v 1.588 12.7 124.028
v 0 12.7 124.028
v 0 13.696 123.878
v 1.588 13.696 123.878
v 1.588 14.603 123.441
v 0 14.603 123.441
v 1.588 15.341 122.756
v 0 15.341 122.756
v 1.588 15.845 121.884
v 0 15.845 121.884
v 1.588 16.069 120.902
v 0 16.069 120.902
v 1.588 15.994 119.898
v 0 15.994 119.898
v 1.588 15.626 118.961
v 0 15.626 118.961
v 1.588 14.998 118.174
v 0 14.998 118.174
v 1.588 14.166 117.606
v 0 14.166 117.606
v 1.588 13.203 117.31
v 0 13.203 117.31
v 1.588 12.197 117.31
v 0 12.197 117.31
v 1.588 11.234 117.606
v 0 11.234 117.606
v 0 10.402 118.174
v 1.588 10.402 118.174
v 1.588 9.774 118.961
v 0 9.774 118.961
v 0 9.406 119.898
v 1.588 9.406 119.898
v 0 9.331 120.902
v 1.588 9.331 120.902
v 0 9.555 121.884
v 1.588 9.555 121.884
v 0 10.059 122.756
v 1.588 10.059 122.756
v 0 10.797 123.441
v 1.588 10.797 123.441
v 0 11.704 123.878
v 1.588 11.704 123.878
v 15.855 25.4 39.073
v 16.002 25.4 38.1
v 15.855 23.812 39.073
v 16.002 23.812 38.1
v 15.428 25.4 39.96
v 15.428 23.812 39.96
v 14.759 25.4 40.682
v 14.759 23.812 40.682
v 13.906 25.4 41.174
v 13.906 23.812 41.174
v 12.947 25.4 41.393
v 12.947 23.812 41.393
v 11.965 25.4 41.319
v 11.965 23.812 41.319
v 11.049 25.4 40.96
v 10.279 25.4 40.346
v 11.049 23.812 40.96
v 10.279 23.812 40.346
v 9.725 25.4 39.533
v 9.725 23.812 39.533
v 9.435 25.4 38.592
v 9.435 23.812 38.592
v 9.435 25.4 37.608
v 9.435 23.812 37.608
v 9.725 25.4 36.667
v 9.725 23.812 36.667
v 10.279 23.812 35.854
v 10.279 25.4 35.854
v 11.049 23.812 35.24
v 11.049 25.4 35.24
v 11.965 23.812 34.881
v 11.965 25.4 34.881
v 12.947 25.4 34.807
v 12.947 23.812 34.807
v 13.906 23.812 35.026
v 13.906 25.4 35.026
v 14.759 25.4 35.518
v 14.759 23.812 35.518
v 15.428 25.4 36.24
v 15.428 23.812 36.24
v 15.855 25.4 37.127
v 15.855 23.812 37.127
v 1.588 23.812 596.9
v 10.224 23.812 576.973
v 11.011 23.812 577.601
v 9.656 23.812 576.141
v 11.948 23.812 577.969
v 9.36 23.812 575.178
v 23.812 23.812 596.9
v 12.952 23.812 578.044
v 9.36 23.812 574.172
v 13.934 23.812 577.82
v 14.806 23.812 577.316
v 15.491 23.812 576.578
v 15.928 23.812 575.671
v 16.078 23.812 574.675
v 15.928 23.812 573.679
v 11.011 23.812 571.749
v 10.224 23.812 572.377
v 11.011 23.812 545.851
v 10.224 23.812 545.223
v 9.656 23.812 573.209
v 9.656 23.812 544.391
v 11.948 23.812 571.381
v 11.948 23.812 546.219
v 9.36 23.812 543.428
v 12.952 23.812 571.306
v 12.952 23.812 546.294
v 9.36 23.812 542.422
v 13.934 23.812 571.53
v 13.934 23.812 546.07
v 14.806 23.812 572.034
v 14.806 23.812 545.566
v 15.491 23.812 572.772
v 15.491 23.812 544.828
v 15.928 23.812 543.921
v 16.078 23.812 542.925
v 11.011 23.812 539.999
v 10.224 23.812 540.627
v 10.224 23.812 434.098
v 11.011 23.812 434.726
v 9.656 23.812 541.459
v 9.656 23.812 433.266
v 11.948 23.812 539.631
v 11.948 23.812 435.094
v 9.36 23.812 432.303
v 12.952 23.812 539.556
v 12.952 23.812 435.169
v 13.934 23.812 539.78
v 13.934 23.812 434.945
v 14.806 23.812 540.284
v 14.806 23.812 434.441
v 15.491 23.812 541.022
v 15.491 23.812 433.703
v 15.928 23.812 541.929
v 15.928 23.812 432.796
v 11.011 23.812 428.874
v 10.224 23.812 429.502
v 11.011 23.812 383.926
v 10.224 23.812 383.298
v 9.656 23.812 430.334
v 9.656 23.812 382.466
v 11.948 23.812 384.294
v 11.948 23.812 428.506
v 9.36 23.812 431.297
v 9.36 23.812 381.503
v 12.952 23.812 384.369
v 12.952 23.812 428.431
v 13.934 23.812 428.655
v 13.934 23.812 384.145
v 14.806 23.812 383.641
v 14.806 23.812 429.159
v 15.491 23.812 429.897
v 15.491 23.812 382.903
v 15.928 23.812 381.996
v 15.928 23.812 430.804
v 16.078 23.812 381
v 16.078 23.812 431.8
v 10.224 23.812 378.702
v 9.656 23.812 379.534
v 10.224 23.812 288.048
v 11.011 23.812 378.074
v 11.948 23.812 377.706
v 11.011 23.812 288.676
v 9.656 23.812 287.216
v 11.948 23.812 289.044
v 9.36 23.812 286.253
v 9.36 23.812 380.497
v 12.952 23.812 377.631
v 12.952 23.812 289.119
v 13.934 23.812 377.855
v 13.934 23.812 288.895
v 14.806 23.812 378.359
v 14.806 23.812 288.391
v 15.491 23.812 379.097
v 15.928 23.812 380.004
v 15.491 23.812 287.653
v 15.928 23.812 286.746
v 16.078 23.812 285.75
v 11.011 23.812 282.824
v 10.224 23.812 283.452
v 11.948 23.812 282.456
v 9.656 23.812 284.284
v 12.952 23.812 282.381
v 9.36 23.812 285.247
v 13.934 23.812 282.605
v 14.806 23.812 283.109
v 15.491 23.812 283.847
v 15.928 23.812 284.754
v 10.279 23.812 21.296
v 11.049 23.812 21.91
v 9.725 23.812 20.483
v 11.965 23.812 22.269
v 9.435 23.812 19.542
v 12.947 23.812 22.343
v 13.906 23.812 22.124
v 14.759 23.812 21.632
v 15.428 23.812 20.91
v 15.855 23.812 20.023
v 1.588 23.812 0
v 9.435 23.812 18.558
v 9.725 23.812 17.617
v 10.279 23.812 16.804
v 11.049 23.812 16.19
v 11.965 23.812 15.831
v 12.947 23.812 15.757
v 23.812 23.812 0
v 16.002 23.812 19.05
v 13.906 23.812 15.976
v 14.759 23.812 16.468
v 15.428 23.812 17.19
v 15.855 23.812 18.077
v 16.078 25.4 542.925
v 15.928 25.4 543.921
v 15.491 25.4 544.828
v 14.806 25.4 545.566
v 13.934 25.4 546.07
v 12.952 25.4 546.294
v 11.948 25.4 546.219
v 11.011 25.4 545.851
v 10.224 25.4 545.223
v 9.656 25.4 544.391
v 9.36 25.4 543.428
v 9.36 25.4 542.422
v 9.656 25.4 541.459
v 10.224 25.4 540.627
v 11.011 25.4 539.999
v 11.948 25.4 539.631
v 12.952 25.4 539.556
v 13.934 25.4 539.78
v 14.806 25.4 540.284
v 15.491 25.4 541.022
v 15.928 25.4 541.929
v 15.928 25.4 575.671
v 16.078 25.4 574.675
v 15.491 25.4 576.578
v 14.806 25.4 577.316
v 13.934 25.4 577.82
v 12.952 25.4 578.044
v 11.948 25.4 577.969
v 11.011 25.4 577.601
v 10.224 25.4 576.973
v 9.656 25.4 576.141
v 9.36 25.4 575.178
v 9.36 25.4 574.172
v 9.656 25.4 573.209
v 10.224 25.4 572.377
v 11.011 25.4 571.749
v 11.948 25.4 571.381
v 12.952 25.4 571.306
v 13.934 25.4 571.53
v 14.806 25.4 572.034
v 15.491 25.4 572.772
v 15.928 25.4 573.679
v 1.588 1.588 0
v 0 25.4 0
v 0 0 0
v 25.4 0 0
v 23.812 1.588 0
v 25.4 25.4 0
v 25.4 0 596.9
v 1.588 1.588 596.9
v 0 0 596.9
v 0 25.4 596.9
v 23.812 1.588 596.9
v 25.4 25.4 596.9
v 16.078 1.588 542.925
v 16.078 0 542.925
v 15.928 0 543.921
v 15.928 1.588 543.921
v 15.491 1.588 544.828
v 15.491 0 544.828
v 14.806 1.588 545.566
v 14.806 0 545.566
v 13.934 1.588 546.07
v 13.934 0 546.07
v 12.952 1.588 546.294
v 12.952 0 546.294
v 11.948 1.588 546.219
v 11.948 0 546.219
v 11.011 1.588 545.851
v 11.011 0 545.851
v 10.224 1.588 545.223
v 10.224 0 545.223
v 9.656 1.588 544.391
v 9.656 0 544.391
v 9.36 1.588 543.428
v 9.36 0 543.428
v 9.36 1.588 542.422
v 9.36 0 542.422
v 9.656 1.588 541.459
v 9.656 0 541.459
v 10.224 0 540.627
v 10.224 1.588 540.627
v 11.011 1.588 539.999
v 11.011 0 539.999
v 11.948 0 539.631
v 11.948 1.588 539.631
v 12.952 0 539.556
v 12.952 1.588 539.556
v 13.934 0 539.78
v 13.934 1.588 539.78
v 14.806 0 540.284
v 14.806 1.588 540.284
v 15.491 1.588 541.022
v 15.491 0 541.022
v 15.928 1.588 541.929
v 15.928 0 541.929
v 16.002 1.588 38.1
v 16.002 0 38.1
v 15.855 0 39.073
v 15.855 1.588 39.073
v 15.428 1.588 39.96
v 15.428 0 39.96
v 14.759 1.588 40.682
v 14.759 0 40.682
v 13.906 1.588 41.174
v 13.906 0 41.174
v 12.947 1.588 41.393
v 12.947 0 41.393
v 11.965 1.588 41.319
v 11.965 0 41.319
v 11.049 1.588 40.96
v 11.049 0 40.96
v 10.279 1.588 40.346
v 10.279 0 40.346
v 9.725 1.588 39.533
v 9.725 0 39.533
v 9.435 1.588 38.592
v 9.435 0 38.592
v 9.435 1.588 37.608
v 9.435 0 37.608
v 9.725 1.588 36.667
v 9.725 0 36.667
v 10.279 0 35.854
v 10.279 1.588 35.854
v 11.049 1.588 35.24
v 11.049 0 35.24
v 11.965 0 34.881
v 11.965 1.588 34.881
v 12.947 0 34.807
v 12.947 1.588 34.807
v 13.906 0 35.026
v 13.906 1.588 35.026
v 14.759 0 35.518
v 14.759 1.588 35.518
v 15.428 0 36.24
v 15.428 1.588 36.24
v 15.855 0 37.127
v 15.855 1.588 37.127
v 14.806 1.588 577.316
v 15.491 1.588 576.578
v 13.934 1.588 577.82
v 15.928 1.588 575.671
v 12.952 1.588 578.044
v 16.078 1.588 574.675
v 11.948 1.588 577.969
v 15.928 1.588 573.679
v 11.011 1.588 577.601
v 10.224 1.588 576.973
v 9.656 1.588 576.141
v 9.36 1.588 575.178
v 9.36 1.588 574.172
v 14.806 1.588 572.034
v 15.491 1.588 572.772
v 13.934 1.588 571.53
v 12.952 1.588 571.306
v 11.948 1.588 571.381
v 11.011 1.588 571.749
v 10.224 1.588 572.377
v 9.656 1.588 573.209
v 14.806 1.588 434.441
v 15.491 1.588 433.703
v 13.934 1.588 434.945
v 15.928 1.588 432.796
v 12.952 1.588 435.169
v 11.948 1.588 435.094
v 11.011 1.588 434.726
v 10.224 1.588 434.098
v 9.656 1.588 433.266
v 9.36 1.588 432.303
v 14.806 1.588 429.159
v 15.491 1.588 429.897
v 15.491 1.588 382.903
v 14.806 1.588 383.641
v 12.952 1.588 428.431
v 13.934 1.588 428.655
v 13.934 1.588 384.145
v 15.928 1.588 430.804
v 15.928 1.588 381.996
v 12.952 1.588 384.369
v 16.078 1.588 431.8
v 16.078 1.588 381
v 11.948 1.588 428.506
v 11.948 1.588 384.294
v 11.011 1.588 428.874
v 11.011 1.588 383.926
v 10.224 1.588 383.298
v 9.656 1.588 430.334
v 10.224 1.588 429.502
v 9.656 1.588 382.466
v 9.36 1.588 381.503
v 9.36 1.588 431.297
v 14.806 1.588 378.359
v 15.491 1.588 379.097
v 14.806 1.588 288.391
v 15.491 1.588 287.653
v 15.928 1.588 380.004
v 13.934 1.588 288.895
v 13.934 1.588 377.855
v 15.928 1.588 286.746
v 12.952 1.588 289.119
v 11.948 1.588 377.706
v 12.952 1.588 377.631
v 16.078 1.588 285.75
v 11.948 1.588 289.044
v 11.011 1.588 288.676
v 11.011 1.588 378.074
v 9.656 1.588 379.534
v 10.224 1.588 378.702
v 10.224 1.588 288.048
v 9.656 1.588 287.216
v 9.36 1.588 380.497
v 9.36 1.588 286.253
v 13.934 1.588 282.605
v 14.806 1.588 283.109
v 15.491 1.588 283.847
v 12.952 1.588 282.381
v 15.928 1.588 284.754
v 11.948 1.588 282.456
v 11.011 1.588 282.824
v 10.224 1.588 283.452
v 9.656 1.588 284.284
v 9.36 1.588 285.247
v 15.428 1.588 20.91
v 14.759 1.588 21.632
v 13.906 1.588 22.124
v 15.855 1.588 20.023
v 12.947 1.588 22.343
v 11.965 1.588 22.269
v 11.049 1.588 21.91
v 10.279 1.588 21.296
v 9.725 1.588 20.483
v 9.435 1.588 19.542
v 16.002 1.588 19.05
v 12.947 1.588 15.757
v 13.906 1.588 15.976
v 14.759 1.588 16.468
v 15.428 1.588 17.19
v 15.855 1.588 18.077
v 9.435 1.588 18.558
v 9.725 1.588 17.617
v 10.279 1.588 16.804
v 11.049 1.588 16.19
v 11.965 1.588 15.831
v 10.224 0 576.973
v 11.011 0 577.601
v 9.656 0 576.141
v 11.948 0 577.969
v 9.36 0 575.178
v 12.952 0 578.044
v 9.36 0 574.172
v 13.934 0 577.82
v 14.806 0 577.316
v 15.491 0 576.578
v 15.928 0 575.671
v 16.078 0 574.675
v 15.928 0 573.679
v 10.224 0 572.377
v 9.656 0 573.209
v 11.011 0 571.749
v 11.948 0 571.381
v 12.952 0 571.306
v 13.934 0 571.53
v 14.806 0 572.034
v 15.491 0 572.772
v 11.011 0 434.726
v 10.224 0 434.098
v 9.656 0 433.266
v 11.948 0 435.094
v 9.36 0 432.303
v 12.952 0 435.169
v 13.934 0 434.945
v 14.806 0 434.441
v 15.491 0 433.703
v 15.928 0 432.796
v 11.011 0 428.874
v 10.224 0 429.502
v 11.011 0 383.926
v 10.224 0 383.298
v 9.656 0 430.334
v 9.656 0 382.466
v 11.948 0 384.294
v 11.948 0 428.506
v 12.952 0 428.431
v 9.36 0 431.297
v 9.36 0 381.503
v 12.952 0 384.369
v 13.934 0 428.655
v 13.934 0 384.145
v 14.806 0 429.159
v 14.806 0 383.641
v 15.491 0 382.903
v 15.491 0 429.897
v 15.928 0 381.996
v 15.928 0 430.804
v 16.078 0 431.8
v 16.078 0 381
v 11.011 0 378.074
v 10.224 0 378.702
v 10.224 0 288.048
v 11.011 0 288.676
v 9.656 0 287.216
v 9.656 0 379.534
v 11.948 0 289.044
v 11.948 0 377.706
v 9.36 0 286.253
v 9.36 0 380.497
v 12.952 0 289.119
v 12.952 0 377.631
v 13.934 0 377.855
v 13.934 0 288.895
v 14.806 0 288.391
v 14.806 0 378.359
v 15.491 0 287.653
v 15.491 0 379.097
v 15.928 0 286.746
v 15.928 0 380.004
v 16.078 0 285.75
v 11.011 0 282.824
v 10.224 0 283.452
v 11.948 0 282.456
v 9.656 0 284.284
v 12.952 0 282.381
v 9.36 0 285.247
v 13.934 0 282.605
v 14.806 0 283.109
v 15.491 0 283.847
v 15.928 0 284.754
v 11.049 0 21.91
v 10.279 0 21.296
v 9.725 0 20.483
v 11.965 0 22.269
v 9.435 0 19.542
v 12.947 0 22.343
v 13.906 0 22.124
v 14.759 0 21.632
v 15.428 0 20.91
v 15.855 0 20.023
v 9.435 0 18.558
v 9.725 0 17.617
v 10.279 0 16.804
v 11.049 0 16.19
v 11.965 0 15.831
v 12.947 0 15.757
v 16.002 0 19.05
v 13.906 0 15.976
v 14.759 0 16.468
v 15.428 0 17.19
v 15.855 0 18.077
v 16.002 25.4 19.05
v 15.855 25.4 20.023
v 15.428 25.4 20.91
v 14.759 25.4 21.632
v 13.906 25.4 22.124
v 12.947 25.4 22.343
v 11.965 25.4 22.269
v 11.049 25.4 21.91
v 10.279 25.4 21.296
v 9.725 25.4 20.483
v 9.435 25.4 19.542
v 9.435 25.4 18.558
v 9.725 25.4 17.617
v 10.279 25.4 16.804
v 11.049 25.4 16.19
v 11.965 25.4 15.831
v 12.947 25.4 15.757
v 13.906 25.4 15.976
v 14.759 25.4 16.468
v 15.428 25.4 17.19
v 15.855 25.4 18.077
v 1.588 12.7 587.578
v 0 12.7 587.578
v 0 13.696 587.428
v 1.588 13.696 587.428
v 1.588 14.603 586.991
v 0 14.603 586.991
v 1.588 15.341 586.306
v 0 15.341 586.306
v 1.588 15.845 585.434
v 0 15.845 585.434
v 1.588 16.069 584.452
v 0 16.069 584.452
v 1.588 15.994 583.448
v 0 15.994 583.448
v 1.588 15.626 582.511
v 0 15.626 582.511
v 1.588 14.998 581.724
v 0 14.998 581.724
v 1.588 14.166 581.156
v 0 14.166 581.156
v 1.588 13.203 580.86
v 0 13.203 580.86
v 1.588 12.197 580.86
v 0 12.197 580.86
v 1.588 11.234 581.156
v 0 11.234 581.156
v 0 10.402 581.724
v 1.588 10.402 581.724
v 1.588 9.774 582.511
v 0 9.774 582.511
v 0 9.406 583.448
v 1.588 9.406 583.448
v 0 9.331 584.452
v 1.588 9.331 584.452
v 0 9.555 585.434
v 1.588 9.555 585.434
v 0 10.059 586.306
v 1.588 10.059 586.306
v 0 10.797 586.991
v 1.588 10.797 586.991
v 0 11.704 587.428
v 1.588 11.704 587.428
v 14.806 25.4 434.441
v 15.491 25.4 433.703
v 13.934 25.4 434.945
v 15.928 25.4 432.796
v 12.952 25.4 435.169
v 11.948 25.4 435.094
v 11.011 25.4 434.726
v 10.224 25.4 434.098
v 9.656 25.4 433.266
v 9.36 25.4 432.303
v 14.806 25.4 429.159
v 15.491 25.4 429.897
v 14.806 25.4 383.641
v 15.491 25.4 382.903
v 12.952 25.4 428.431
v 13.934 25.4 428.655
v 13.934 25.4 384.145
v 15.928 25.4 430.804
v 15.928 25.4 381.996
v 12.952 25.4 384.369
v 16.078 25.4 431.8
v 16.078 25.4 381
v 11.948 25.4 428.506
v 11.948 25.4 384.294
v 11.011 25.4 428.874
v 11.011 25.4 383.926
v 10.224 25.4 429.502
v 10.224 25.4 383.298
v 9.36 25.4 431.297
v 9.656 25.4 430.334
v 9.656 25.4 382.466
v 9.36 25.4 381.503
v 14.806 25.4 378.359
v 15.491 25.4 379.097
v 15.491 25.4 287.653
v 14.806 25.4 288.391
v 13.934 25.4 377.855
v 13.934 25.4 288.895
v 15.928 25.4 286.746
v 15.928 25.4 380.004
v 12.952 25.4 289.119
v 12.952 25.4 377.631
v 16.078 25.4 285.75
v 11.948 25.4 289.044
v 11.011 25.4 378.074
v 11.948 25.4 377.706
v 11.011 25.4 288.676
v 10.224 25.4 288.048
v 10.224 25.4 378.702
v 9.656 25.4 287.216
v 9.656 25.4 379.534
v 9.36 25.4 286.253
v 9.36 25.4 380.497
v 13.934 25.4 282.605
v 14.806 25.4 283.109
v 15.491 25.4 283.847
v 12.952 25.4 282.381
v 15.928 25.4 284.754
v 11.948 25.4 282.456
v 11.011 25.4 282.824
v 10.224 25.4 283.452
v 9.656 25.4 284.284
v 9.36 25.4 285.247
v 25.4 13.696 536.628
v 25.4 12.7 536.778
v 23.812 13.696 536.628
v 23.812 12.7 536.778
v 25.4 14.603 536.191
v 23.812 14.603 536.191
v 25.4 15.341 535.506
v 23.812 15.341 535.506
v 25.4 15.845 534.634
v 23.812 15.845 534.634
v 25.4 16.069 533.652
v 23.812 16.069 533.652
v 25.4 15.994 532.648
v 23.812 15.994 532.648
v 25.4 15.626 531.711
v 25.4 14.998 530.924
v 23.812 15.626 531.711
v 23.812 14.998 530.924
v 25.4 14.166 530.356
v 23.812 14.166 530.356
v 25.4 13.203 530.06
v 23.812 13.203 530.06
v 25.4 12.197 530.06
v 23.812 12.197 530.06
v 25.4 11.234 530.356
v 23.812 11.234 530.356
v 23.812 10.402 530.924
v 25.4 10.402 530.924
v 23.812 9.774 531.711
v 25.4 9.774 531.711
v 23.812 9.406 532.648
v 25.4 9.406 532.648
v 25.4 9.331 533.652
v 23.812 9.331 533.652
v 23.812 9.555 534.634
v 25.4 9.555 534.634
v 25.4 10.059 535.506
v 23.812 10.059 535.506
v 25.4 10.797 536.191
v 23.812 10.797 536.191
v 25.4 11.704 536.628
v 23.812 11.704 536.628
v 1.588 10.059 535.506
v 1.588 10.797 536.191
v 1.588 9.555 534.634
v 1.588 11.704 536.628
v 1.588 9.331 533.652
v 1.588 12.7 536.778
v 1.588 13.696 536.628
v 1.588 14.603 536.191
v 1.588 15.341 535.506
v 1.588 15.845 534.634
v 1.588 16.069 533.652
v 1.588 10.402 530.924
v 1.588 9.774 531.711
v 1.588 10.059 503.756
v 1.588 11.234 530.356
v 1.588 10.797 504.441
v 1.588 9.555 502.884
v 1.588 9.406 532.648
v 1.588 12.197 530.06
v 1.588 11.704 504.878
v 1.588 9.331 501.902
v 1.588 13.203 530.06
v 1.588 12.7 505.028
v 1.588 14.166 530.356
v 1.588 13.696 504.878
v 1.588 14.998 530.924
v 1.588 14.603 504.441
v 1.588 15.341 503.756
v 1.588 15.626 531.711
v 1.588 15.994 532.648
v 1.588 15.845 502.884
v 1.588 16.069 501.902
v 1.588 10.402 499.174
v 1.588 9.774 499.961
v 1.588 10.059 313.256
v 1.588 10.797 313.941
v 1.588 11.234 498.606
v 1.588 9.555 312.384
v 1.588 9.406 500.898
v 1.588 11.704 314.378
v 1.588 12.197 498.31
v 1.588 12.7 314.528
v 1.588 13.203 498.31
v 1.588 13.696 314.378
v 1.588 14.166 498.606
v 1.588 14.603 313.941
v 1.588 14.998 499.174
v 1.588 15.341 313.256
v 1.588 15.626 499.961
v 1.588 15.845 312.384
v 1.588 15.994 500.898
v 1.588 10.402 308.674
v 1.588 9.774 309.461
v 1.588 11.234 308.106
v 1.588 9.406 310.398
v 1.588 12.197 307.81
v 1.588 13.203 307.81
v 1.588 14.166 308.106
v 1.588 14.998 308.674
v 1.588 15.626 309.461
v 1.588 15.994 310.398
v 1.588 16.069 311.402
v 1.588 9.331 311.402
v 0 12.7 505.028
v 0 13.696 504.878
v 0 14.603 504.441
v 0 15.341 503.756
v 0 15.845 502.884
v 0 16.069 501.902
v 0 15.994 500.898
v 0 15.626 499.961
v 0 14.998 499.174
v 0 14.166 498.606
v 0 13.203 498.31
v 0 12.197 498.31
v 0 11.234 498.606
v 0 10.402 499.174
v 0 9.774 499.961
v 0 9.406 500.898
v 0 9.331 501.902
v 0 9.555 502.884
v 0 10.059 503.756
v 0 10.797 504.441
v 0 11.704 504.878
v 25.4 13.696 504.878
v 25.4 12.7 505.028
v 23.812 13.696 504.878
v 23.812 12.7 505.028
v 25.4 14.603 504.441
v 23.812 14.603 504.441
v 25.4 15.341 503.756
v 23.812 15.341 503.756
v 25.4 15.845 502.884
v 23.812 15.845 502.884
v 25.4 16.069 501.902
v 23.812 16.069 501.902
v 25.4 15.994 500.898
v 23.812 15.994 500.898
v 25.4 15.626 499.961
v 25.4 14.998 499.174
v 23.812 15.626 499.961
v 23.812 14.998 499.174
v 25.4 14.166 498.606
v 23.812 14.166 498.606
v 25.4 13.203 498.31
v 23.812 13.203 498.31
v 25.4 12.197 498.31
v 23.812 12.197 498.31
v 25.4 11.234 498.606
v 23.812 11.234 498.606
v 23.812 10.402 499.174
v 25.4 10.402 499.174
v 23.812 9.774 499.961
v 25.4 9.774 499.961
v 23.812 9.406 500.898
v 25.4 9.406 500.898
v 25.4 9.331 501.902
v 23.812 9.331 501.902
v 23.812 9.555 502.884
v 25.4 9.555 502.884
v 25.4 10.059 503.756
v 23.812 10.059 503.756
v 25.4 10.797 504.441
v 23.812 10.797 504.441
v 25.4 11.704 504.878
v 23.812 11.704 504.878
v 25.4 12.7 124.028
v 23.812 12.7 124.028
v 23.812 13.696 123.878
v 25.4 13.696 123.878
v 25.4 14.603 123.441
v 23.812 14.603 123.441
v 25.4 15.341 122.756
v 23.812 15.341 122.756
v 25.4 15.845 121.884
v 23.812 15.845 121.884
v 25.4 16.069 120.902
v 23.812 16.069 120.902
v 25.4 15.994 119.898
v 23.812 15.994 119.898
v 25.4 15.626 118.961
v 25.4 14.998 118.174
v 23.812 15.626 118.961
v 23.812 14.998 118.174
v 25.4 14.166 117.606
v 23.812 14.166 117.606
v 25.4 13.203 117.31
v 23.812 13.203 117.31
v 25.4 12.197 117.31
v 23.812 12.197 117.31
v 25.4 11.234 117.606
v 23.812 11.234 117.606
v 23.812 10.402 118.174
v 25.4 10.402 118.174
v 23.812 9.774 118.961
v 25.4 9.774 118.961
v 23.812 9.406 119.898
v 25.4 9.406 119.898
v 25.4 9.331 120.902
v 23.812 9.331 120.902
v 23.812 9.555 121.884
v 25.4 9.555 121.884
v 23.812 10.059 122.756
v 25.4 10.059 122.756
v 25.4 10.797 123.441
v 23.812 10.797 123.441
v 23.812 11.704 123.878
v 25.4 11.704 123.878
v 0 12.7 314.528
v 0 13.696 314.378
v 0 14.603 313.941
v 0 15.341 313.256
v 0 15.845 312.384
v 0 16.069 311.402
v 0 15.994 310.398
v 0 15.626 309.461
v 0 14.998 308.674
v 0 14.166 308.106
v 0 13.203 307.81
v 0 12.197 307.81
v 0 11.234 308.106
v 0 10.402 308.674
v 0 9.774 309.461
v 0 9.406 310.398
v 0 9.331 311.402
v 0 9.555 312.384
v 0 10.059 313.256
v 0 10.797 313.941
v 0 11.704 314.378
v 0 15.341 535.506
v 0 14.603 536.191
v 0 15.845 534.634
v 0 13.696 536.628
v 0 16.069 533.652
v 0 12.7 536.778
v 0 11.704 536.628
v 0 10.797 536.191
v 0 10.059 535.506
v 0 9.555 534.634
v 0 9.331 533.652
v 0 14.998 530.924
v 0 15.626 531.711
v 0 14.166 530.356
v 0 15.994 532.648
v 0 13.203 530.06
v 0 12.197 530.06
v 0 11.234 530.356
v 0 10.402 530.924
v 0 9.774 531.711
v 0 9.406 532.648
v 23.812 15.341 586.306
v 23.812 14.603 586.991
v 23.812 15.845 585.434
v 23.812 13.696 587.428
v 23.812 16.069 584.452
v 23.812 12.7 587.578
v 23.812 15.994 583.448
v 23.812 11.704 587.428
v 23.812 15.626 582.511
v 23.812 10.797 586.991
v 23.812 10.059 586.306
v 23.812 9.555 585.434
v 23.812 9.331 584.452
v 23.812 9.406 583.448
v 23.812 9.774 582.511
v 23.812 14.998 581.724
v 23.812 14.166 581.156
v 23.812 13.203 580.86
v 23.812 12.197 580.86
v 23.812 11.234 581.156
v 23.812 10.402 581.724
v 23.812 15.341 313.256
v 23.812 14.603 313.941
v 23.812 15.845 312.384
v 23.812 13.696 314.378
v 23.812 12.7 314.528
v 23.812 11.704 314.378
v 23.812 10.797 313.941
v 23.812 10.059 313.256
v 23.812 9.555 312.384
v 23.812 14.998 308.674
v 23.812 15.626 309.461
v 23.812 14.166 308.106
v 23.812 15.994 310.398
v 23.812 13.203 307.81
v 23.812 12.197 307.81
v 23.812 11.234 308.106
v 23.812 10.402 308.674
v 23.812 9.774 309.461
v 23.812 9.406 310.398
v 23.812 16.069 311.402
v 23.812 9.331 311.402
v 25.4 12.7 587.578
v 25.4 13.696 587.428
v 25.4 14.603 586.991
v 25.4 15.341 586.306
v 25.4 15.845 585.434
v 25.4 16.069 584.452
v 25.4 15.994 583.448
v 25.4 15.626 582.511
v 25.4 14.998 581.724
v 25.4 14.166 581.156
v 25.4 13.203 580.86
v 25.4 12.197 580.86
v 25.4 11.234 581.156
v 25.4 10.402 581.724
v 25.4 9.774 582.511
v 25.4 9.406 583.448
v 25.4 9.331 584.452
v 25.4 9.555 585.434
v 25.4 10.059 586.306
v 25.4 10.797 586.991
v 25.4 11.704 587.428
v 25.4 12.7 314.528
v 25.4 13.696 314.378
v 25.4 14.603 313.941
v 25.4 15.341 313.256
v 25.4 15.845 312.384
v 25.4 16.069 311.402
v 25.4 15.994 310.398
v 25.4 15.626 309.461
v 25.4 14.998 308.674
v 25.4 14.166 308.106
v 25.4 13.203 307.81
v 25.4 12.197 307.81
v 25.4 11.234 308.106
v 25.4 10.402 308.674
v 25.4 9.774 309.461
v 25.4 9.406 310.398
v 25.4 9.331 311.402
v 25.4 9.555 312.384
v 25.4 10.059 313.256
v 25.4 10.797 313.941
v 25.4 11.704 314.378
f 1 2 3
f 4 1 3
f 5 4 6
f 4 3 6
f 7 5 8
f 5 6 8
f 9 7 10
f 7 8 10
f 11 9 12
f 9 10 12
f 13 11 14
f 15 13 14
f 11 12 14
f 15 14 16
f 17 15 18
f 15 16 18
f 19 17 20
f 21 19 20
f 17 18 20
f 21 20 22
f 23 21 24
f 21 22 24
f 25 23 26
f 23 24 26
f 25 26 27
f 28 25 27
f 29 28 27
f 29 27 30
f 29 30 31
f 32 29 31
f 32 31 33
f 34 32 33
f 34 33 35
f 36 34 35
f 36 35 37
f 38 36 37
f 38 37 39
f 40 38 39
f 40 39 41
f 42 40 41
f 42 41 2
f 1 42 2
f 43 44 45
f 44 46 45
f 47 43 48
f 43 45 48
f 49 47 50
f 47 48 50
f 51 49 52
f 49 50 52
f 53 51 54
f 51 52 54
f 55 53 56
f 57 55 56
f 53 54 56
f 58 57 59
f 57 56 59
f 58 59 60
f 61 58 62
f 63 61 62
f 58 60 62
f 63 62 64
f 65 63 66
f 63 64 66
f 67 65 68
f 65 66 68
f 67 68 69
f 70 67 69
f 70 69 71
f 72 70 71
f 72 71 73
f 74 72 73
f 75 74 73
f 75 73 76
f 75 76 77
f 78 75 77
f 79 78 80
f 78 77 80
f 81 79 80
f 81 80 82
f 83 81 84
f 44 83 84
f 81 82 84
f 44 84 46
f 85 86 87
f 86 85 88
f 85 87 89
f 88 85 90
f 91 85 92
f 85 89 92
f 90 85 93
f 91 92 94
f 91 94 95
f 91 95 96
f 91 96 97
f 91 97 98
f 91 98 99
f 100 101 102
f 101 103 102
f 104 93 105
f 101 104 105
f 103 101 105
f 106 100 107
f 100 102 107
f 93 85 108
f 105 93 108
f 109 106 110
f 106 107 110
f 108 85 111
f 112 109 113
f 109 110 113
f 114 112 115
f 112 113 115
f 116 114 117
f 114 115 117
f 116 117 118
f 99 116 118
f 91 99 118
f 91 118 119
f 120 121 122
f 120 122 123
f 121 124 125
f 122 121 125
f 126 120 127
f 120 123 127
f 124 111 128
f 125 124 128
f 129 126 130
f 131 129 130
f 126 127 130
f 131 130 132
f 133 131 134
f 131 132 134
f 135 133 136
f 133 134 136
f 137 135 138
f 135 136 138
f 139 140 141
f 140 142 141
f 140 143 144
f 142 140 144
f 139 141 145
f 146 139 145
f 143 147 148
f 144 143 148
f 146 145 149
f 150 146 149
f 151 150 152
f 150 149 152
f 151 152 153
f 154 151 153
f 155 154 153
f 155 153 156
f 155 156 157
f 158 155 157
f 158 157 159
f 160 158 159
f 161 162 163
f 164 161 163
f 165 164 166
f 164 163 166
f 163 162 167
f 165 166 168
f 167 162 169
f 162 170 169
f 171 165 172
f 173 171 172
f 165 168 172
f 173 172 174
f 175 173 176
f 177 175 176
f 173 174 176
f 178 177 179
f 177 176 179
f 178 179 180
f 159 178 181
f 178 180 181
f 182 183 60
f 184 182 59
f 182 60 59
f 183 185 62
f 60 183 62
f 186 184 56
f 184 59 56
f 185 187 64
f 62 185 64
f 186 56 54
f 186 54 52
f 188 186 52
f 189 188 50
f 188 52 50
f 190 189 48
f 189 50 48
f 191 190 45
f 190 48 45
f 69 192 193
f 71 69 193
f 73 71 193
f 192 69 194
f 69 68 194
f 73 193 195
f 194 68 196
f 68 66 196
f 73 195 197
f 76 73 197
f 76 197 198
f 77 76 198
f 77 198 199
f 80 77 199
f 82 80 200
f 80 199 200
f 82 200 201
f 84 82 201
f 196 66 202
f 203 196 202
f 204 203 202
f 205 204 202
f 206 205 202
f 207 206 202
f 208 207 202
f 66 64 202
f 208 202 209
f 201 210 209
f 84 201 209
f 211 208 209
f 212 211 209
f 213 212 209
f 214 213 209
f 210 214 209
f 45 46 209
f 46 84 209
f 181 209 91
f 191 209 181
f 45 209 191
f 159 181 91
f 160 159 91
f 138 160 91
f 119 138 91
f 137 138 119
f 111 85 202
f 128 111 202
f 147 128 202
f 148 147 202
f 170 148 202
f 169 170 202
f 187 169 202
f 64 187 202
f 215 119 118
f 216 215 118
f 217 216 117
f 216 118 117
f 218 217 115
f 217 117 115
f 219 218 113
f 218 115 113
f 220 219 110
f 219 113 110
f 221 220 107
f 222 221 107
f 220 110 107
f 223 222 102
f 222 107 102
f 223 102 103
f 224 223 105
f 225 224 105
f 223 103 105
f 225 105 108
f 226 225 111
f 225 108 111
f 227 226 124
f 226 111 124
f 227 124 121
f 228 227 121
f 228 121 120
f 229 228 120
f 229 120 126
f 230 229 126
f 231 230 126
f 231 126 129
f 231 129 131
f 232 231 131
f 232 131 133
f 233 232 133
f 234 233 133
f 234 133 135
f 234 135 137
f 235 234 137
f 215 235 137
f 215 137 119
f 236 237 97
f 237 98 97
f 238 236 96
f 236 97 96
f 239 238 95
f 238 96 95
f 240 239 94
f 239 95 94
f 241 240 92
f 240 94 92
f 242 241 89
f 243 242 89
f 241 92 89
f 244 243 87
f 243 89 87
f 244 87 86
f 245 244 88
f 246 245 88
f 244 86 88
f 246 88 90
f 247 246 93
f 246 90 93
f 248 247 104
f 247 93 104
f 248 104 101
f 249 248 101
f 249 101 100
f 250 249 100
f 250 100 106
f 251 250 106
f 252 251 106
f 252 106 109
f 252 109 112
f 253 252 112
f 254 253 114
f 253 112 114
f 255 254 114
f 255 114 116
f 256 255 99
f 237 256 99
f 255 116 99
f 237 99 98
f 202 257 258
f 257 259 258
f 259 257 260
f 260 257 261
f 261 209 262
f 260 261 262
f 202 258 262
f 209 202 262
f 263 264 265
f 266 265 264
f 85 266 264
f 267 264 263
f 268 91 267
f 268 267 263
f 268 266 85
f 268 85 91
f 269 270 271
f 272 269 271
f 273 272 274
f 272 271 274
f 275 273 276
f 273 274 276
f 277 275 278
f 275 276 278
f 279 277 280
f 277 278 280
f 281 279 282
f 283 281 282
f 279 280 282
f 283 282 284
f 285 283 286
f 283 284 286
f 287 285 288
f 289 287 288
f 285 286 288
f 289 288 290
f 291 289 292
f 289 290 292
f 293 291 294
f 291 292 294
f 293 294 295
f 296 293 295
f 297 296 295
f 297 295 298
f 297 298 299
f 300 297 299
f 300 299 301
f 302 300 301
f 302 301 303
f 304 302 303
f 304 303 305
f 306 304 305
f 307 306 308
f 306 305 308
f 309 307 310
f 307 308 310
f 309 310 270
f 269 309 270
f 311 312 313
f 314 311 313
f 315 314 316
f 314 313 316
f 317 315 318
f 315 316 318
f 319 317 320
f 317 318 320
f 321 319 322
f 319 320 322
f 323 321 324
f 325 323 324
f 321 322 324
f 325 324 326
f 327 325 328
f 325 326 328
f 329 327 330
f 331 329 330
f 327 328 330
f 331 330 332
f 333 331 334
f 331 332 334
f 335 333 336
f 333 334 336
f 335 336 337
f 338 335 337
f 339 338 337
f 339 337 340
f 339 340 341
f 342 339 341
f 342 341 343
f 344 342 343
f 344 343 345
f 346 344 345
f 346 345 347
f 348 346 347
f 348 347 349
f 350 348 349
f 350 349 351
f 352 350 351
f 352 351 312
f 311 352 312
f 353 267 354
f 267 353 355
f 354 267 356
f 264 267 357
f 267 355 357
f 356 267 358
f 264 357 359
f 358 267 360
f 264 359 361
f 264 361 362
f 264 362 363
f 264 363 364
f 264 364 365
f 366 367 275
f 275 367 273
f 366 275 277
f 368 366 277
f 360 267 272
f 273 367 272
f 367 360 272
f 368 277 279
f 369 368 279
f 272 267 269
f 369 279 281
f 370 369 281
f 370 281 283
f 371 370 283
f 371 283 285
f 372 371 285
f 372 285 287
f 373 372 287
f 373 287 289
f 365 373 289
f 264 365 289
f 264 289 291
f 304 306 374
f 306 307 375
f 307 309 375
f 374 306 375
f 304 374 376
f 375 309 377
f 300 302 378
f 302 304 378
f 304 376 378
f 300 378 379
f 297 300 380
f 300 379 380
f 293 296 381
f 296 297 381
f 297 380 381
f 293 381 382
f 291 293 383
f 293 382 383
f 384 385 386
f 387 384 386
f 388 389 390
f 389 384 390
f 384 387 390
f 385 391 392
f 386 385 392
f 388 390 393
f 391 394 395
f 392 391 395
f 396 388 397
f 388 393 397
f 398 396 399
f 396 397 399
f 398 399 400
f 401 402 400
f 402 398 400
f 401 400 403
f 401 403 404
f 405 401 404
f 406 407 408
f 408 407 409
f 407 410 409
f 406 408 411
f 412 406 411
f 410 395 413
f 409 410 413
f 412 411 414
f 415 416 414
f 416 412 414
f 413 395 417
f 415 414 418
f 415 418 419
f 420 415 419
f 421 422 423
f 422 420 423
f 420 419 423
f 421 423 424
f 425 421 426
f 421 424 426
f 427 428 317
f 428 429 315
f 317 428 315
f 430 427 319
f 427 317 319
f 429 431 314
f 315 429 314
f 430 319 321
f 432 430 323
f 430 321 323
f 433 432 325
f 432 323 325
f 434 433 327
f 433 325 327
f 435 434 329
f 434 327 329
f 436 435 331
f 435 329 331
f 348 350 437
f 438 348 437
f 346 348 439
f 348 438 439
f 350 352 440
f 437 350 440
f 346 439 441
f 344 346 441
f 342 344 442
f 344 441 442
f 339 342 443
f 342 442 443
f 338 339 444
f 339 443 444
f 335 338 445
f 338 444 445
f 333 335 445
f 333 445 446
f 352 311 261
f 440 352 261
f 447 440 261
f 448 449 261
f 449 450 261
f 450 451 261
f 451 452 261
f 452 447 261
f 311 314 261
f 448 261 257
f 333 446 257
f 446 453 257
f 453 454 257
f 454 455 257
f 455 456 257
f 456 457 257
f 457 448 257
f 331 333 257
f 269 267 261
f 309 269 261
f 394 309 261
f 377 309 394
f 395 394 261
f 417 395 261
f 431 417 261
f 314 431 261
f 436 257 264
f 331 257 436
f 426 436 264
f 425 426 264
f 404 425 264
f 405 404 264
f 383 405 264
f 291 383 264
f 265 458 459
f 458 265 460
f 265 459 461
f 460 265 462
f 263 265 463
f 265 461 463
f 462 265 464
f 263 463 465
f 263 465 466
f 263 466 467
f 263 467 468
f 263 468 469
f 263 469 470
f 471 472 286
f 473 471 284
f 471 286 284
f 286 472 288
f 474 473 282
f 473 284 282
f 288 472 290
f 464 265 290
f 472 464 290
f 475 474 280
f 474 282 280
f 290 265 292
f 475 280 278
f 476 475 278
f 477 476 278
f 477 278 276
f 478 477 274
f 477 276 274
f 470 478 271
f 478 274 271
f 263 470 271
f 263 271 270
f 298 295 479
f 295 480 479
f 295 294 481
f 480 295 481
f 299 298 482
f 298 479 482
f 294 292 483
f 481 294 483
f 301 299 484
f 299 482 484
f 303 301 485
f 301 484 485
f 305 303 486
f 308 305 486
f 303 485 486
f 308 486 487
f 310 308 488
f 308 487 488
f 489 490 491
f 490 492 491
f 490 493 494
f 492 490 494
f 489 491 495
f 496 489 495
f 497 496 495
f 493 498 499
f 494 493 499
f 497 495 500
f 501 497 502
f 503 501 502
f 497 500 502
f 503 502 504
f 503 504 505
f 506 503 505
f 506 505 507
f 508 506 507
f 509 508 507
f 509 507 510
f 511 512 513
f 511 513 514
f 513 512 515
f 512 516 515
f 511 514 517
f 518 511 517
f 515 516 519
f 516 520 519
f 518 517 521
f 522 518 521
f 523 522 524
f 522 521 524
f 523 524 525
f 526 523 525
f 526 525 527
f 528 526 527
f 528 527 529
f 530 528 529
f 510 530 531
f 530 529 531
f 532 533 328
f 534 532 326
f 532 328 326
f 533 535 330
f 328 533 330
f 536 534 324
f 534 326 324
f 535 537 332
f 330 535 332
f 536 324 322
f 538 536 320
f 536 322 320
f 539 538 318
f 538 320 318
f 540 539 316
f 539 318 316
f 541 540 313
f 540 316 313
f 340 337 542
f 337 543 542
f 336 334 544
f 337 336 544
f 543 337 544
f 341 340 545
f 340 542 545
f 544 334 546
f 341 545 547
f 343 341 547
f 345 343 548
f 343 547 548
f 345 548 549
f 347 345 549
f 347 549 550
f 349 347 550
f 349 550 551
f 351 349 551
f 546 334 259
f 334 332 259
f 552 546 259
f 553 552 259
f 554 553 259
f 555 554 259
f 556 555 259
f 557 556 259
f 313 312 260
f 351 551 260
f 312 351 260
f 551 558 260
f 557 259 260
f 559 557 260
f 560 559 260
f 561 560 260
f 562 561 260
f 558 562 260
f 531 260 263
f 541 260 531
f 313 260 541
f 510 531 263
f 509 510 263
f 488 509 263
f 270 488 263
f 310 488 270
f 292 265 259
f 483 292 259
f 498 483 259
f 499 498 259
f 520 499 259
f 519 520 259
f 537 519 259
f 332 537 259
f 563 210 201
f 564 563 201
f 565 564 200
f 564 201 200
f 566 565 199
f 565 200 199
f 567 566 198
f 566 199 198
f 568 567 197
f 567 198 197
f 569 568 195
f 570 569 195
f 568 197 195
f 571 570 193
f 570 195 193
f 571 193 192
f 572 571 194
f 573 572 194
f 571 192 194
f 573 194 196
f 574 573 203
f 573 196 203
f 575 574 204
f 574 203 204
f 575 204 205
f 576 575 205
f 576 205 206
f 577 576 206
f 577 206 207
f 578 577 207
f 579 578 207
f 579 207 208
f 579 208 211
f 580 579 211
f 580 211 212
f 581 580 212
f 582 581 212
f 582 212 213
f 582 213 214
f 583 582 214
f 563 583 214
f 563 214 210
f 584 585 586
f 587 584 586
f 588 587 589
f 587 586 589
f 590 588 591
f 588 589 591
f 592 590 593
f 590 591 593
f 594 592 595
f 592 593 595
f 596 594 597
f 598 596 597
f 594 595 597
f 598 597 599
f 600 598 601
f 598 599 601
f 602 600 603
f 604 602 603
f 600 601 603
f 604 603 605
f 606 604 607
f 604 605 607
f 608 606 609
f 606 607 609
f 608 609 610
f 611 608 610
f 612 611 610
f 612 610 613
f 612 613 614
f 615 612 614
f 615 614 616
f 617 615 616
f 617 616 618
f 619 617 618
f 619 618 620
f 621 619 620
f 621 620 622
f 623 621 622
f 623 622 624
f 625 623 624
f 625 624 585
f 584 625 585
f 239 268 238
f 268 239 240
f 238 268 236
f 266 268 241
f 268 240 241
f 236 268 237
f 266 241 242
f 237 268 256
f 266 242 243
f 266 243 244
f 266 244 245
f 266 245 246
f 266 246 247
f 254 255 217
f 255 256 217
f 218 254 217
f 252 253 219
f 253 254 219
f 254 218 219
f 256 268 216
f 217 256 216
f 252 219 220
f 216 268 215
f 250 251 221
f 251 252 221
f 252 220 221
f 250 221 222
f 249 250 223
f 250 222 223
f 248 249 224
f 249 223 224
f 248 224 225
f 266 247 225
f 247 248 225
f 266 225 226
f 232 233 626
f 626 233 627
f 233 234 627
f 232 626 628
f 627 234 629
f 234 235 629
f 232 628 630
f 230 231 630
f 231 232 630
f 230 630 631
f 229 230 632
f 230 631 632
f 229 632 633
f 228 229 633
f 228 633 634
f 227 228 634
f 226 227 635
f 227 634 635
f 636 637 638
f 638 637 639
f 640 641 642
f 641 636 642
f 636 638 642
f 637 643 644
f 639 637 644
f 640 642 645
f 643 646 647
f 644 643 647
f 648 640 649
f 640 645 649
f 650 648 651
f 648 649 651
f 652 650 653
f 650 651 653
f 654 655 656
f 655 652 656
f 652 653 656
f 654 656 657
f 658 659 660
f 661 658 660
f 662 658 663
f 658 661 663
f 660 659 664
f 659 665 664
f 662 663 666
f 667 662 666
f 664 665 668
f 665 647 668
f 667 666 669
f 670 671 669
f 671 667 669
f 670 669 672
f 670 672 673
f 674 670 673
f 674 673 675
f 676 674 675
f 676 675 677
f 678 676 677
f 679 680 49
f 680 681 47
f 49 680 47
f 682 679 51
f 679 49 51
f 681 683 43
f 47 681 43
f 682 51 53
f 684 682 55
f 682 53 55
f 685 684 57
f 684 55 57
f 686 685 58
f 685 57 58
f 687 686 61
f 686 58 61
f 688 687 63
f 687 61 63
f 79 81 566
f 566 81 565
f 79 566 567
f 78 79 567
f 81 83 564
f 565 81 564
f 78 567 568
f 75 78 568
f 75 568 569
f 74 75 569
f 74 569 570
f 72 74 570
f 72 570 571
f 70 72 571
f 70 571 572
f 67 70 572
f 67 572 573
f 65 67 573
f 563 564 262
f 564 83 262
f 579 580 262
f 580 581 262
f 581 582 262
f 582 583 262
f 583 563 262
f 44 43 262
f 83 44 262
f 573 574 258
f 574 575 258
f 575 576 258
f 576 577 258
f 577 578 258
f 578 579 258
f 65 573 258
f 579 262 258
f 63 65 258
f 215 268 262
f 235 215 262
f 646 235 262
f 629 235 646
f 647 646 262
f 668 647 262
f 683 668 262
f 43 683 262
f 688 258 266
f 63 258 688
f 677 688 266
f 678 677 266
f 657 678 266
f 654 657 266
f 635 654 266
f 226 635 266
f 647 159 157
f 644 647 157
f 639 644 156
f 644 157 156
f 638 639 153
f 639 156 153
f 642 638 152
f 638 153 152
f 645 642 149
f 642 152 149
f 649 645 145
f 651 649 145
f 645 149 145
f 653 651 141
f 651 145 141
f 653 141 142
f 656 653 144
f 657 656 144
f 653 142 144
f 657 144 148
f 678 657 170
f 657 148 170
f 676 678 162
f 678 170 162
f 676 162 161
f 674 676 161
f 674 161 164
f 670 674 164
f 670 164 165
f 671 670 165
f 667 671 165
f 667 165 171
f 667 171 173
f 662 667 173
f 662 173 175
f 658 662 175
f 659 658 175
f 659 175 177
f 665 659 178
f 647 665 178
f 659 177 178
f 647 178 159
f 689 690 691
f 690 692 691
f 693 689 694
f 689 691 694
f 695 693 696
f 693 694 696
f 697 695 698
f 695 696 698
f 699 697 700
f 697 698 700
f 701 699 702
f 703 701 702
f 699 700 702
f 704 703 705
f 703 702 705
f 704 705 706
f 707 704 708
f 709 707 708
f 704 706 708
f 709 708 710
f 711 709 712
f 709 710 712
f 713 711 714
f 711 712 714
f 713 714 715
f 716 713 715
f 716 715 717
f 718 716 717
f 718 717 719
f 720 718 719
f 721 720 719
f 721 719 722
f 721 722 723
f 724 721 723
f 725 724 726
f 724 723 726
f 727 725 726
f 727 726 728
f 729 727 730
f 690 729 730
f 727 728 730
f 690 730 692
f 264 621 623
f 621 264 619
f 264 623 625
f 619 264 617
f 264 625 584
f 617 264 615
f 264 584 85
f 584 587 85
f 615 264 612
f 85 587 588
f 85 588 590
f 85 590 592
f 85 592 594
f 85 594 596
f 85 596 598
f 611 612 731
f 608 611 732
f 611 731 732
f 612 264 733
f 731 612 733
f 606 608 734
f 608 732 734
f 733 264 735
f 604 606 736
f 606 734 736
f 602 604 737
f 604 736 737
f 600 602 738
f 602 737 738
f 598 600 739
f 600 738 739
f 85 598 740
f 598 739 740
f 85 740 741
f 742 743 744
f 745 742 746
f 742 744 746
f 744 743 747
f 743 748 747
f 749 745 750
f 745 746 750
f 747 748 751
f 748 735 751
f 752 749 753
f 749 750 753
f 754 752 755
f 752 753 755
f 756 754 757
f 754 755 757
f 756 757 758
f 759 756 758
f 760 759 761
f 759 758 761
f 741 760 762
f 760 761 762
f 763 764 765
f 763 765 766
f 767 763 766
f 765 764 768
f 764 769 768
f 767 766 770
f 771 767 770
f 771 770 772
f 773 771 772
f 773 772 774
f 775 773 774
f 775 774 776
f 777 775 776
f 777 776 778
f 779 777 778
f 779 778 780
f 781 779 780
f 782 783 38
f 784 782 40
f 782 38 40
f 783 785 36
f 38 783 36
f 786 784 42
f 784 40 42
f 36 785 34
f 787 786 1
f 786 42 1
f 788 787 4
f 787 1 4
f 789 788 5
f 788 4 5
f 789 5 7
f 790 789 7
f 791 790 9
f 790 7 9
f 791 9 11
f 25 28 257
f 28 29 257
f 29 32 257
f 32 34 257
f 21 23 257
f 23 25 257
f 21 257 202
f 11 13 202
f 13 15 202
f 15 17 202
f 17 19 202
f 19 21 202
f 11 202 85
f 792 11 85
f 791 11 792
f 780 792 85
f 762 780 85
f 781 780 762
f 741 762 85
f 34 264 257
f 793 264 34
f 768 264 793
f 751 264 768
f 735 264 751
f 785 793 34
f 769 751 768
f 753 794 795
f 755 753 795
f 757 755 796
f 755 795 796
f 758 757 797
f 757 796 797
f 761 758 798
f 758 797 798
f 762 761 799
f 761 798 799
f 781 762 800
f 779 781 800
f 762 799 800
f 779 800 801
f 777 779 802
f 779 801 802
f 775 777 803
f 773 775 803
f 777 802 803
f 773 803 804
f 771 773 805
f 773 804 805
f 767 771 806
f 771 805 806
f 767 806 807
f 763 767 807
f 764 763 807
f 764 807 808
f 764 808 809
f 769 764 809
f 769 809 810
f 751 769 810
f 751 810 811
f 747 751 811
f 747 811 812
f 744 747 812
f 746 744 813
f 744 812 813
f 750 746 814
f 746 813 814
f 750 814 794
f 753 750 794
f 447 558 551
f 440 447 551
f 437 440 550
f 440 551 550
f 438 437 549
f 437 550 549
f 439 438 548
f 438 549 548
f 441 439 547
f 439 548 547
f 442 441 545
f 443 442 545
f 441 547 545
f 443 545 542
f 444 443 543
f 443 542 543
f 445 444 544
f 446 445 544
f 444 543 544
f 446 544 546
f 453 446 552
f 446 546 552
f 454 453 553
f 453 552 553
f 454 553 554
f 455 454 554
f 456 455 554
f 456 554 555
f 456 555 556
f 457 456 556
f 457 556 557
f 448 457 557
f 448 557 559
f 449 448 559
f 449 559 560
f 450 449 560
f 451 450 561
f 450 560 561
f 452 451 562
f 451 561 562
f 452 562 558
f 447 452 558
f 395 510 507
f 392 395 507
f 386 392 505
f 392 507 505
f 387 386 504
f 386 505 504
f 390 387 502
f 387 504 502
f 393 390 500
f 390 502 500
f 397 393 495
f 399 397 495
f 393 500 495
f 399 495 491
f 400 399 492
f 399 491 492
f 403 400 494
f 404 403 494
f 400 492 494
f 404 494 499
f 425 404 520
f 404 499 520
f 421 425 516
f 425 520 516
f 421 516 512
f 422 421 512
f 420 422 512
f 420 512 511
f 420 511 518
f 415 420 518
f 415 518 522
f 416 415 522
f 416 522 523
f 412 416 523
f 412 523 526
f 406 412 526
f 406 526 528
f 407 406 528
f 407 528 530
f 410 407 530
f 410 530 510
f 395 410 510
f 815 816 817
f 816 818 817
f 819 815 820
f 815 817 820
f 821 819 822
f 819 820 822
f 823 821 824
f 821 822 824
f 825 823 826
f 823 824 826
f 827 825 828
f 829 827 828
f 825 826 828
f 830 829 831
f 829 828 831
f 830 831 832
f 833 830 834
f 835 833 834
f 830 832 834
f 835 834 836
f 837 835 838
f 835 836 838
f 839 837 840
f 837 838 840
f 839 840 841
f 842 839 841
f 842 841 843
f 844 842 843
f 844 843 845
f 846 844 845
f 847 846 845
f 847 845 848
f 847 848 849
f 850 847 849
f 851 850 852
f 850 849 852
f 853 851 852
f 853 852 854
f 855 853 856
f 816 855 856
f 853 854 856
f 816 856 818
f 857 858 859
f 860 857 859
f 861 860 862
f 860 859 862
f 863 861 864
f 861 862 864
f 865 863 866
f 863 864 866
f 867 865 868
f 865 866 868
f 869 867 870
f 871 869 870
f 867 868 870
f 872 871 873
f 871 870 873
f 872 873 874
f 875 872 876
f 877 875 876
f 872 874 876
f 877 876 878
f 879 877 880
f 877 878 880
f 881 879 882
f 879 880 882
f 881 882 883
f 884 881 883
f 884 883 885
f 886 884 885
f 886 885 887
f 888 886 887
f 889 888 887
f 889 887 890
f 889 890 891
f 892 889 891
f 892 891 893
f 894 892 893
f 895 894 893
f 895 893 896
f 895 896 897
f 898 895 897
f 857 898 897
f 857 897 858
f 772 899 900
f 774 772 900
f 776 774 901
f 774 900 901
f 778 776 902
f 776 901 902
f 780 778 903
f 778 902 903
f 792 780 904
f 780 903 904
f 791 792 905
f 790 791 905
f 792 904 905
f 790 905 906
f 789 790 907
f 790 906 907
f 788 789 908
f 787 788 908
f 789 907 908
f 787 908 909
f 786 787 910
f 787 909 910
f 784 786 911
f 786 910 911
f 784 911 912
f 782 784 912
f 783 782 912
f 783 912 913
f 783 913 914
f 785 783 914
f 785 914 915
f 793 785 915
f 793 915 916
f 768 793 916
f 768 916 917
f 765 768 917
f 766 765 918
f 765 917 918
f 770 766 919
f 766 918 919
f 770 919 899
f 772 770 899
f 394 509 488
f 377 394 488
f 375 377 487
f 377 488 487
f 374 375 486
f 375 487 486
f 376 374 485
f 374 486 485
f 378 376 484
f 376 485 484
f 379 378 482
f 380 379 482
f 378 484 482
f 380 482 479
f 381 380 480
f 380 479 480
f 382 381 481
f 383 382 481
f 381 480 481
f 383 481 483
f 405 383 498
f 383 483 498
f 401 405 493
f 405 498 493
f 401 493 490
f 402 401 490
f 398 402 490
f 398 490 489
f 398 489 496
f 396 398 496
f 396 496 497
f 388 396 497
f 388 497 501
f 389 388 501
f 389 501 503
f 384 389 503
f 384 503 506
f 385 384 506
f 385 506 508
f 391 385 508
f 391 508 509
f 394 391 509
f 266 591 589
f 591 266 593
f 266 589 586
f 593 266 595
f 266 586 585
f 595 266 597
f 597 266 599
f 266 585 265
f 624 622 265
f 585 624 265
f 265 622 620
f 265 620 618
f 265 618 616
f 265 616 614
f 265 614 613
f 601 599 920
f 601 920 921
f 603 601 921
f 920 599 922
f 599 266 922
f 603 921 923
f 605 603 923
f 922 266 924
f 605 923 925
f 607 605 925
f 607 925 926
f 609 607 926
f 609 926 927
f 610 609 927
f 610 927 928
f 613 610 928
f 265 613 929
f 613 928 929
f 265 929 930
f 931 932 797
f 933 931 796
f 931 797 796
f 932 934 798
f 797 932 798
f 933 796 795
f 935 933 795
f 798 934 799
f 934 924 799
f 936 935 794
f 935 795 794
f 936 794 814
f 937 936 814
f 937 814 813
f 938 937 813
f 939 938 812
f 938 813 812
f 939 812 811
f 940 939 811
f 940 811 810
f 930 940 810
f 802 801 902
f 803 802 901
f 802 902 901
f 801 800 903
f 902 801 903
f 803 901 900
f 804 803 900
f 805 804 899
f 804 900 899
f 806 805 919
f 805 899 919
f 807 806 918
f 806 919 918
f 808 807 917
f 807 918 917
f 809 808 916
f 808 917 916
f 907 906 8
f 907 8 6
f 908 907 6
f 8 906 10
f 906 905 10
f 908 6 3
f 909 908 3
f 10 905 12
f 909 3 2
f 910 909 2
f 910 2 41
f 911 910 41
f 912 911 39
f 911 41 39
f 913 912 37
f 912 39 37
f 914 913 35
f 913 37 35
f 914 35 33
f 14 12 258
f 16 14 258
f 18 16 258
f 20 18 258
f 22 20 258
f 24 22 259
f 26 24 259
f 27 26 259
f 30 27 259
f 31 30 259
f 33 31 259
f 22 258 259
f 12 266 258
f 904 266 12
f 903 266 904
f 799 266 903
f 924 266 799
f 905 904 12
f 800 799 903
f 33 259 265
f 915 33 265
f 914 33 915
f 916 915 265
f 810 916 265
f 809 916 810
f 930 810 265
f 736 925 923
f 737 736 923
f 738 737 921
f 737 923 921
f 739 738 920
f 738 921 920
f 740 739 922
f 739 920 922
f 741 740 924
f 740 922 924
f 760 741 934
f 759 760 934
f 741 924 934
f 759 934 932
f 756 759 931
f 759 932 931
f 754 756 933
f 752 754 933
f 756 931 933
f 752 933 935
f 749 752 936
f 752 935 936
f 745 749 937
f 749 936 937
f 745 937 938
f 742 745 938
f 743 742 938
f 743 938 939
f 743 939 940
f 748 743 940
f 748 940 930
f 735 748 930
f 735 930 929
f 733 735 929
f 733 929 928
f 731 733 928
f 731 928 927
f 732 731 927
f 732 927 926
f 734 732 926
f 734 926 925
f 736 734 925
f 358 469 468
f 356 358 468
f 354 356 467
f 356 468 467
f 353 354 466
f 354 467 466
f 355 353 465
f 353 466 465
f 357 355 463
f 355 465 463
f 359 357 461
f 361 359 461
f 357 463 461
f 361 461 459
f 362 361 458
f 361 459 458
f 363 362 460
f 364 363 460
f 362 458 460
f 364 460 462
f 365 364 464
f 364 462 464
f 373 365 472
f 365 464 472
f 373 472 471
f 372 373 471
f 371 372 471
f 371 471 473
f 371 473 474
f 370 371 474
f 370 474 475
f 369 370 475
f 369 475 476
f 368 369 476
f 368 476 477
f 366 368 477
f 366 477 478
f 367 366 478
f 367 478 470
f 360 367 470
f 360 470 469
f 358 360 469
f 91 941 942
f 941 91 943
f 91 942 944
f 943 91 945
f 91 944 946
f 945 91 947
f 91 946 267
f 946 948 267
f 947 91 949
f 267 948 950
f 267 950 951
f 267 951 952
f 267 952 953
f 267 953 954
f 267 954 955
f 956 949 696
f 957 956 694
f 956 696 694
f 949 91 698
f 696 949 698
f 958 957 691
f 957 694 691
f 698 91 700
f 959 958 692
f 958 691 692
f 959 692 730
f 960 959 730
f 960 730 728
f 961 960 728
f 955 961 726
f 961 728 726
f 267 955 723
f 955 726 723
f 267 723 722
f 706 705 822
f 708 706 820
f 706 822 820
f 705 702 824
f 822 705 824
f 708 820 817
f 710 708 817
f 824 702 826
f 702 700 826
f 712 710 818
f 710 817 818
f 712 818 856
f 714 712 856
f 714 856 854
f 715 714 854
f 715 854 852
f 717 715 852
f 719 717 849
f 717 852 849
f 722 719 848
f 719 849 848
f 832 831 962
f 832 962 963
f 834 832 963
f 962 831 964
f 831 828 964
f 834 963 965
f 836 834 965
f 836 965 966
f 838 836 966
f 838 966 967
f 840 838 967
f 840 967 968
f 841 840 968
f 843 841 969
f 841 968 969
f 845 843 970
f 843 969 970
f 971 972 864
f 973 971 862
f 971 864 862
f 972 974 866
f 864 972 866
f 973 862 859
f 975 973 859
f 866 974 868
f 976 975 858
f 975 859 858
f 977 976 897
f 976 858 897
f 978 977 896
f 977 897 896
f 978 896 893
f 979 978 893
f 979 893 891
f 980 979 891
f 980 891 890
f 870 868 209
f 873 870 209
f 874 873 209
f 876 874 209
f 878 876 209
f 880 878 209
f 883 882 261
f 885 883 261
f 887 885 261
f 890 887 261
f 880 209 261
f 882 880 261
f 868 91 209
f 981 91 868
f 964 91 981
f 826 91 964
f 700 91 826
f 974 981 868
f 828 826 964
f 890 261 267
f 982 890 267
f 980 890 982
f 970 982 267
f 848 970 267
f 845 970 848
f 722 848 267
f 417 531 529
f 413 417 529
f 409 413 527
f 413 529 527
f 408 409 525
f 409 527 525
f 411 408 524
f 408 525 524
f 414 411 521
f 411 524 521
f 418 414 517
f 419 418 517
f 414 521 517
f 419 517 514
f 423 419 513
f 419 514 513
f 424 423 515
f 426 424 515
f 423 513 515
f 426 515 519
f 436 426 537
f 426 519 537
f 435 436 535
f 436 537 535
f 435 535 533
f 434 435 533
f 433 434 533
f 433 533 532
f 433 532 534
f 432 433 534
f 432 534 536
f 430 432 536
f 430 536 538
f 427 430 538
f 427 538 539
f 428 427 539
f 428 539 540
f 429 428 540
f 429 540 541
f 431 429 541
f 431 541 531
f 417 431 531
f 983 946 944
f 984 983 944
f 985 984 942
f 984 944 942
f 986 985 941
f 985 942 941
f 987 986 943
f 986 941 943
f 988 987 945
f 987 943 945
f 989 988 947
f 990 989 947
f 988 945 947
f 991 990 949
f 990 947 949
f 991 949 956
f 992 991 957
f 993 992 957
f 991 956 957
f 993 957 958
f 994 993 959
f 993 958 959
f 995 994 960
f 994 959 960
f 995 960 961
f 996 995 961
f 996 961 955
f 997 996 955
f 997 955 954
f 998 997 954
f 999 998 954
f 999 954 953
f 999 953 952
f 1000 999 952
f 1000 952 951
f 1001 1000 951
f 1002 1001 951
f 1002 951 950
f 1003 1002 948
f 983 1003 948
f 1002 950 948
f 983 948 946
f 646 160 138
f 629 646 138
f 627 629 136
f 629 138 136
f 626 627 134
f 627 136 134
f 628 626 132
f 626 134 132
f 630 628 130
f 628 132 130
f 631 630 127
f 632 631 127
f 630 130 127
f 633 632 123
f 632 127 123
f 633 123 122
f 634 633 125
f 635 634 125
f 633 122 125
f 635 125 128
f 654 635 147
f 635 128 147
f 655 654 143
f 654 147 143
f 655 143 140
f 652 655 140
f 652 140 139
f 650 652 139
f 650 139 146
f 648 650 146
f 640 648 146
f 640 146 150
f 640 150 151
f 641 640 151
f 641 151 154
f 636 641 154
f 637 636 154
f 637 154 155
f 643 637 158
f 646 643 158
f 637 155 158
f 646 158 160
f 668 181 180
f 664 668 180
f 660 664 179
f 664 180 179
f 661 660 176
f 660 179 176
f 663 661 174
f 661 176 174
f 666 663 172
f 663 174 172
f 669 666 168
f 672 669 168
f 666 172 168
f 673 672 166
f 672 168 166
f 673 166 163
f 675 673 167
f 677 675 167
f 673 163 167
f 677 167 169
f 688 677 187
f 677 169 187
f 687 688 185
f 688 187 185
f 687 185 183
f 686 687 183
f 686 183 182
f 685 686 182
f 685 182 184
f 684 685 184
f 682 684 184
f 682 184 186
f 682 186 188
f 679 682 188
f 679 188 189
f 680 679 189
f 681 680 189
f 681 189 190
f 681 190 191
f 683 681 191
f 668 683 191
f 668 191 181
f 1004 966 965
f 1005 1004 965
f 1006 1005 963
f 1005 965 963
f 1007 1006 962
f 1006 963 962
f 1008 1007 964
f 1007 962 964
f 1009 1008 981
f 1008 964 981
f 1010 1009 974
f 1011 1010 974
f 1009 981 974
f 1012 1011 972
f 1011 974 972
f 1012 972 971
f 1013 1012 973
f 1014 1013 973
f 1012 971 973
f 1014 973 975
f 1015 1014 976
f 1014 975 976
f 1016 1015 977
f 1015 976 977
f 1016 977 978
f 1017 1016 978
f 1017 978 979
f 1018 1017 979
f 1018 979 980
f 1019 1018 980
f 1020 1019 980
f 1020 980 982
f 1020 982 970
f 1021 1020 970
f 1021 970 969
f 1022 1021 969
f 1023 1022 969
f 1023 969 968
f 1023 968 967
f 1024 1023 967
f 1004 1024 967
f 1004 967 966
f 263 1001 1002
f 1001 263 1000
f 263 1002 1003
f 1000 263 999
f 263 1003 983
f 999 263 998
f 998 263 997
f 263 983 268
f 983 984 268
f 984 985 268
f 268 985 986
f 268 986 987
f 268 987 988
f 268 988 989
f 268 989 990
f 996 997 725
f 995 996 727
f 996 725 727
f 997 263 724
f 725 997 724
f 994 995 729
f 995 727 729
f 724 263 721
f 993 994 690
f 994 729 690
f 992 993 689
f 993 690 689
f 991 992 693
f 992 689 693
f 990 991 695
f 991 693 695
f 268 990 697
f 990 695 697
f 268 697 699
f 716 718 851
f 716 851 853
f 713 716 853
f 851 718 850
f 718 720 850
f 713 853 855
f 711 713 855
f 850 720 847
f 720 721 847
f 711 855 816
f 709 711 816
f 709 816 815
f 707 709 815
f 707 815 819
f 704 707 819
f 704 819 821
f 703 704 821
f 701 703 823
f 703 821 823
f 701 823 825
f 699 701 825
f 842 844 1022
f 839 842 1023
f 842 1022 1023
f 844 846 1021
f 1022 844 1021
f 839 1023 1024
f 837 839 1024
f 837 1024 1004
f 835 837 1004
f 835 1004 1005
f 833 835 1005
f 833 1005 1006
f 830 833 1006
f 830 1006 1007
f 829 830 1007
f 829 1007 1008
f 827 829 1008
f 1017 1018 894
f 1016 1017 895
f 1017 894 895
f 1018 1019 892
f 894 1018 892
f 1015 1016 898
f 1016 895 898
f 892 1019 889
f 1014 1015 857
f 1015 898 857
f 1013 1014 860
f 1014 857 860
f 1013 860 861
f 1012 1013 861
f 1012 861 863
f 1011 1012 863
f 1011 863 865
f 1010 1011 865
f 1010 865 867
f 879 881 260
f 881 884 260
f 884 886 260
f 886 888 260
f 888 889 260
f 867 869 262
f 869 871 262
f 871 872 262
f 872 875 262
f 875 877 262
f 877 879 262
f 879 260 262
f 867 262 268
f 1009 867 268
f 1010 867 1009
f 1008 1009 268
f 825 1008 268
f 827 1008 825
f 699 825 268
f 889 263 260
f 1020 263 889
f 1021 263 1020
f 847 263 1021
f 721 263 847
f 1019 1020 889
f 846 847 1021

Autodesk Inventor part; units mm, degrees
ref_plane "YZ Plane" through (0, 0, 0) normal (1, 0, 0) x (0, 1, 0)
ref_plane "XZ Plane" through (0, 0, 0) normal (0, 1, 0) x (-1, 0, 0)
ref_plane "XY Plane" through (0, 0, 0) normal (0, 0, 1) x (1, 0, 0)
sketch "Sketch1" plane through (0, 0, 0) normal (0, 0, 1) x (1, 0, 0)
  line L0 (0, 0) -> (25.4, 0)
  line L1 (25.4, 0) -> (25.4, 25.4)
  line L2 (25.4, 25.4) -> (0, 25.4)
  line L3 (0, 25.4) -> (0, 0)
  line L4 (1.5875, 23.8125) -> (23.8125, 23.8125)
  line L5 (23.8125, 23.8125) -> (23.8125, 1.5875)
  line L6 (23.8125, 1.5875) -> (1.5875, 1.5875)
  line L7 (1.5875, 1.5875) -> (1.5875, 23.8125)
  dimension "d0" = 25.4
  dimension "d2" = 25.4
  dimension "d3" = 1.5875
extrude "Extrusion1" add sketch "Sketch1" along normal blind 596.9
sketch "Sketch3" plane through (0, 0, 0) normal (0, -1, 0) x (1, 0, 0)
  circle A0 centre (12.7, 574.675) radius 3.3782 projected
  circle A1 centre (12.7, 542.925) radius 3.3782 projected
  circle A2 centre (12.7, 19.05) radius 3.302 projected
  circle A3 centre (12.7, 38.1) radius 3.302 projected
  arc A4 (3.175, 50.8) -> (0, 47.625) centre (3.175, 47.625) ccw projected
  line L0 (3.175, 50.8) -> (22.225, 50.8) projected
  arc A5 (25.4, 47.625) -> (22.225, 50.8) centre (22.225, 47.625) ccw projected
  line L1 (25.4, 47.625) -> (25.4, 4.445) projected
  line L2 (25.4, 4.445) -> (0, 4.445) projected
  line L3 (0, 47.625) -> (0, 4.445) projected
  circle A6 centre (12.7, 431.8) radius 3.3782 projected
  circle A7 centre (12.7, 381) radius 3.3782 projected
  circle A8 centre (12.7, 285.75) radius 3.3782 projected
extrude "Extrusion3" cut sketch "Sketch3" against normal blind 25.4 contours A0 | A1 | A2 | A3 | A6 | A7 | A8
sketch "Sketch4" plane through (0, 0, 0) normal (-1, 0, 0) x (0, 0, 1)
  circle A0 centre (533.4, 12.7) radius 3.3782 projected
  circle A1 centre (584.2, 12.7) radius 3.3782 projected
  line L0 (0, 25.4) -> (0, 0) projected
  line L1 (596.9, 25.4) -> (596.9, 0) projected
  line L2 (596.9, 12.7) -> (0, 12.7) construction
  circle A2 centre (501.65, 12.7) radius 3.3782
  circle A3 centre (311.15, 12.7) radius 3.3782
  circle A4 centre (120.65, 12.7) radius 3.3782
  dimension "d12" = 31.75
  dimension "d15" = 190.5
extrude "Extrusion4" cut sketch "Sketch4" against normal blind 25.4
properties part number "Rebuild Edge Mount 4" material "Aluminum 6061"
